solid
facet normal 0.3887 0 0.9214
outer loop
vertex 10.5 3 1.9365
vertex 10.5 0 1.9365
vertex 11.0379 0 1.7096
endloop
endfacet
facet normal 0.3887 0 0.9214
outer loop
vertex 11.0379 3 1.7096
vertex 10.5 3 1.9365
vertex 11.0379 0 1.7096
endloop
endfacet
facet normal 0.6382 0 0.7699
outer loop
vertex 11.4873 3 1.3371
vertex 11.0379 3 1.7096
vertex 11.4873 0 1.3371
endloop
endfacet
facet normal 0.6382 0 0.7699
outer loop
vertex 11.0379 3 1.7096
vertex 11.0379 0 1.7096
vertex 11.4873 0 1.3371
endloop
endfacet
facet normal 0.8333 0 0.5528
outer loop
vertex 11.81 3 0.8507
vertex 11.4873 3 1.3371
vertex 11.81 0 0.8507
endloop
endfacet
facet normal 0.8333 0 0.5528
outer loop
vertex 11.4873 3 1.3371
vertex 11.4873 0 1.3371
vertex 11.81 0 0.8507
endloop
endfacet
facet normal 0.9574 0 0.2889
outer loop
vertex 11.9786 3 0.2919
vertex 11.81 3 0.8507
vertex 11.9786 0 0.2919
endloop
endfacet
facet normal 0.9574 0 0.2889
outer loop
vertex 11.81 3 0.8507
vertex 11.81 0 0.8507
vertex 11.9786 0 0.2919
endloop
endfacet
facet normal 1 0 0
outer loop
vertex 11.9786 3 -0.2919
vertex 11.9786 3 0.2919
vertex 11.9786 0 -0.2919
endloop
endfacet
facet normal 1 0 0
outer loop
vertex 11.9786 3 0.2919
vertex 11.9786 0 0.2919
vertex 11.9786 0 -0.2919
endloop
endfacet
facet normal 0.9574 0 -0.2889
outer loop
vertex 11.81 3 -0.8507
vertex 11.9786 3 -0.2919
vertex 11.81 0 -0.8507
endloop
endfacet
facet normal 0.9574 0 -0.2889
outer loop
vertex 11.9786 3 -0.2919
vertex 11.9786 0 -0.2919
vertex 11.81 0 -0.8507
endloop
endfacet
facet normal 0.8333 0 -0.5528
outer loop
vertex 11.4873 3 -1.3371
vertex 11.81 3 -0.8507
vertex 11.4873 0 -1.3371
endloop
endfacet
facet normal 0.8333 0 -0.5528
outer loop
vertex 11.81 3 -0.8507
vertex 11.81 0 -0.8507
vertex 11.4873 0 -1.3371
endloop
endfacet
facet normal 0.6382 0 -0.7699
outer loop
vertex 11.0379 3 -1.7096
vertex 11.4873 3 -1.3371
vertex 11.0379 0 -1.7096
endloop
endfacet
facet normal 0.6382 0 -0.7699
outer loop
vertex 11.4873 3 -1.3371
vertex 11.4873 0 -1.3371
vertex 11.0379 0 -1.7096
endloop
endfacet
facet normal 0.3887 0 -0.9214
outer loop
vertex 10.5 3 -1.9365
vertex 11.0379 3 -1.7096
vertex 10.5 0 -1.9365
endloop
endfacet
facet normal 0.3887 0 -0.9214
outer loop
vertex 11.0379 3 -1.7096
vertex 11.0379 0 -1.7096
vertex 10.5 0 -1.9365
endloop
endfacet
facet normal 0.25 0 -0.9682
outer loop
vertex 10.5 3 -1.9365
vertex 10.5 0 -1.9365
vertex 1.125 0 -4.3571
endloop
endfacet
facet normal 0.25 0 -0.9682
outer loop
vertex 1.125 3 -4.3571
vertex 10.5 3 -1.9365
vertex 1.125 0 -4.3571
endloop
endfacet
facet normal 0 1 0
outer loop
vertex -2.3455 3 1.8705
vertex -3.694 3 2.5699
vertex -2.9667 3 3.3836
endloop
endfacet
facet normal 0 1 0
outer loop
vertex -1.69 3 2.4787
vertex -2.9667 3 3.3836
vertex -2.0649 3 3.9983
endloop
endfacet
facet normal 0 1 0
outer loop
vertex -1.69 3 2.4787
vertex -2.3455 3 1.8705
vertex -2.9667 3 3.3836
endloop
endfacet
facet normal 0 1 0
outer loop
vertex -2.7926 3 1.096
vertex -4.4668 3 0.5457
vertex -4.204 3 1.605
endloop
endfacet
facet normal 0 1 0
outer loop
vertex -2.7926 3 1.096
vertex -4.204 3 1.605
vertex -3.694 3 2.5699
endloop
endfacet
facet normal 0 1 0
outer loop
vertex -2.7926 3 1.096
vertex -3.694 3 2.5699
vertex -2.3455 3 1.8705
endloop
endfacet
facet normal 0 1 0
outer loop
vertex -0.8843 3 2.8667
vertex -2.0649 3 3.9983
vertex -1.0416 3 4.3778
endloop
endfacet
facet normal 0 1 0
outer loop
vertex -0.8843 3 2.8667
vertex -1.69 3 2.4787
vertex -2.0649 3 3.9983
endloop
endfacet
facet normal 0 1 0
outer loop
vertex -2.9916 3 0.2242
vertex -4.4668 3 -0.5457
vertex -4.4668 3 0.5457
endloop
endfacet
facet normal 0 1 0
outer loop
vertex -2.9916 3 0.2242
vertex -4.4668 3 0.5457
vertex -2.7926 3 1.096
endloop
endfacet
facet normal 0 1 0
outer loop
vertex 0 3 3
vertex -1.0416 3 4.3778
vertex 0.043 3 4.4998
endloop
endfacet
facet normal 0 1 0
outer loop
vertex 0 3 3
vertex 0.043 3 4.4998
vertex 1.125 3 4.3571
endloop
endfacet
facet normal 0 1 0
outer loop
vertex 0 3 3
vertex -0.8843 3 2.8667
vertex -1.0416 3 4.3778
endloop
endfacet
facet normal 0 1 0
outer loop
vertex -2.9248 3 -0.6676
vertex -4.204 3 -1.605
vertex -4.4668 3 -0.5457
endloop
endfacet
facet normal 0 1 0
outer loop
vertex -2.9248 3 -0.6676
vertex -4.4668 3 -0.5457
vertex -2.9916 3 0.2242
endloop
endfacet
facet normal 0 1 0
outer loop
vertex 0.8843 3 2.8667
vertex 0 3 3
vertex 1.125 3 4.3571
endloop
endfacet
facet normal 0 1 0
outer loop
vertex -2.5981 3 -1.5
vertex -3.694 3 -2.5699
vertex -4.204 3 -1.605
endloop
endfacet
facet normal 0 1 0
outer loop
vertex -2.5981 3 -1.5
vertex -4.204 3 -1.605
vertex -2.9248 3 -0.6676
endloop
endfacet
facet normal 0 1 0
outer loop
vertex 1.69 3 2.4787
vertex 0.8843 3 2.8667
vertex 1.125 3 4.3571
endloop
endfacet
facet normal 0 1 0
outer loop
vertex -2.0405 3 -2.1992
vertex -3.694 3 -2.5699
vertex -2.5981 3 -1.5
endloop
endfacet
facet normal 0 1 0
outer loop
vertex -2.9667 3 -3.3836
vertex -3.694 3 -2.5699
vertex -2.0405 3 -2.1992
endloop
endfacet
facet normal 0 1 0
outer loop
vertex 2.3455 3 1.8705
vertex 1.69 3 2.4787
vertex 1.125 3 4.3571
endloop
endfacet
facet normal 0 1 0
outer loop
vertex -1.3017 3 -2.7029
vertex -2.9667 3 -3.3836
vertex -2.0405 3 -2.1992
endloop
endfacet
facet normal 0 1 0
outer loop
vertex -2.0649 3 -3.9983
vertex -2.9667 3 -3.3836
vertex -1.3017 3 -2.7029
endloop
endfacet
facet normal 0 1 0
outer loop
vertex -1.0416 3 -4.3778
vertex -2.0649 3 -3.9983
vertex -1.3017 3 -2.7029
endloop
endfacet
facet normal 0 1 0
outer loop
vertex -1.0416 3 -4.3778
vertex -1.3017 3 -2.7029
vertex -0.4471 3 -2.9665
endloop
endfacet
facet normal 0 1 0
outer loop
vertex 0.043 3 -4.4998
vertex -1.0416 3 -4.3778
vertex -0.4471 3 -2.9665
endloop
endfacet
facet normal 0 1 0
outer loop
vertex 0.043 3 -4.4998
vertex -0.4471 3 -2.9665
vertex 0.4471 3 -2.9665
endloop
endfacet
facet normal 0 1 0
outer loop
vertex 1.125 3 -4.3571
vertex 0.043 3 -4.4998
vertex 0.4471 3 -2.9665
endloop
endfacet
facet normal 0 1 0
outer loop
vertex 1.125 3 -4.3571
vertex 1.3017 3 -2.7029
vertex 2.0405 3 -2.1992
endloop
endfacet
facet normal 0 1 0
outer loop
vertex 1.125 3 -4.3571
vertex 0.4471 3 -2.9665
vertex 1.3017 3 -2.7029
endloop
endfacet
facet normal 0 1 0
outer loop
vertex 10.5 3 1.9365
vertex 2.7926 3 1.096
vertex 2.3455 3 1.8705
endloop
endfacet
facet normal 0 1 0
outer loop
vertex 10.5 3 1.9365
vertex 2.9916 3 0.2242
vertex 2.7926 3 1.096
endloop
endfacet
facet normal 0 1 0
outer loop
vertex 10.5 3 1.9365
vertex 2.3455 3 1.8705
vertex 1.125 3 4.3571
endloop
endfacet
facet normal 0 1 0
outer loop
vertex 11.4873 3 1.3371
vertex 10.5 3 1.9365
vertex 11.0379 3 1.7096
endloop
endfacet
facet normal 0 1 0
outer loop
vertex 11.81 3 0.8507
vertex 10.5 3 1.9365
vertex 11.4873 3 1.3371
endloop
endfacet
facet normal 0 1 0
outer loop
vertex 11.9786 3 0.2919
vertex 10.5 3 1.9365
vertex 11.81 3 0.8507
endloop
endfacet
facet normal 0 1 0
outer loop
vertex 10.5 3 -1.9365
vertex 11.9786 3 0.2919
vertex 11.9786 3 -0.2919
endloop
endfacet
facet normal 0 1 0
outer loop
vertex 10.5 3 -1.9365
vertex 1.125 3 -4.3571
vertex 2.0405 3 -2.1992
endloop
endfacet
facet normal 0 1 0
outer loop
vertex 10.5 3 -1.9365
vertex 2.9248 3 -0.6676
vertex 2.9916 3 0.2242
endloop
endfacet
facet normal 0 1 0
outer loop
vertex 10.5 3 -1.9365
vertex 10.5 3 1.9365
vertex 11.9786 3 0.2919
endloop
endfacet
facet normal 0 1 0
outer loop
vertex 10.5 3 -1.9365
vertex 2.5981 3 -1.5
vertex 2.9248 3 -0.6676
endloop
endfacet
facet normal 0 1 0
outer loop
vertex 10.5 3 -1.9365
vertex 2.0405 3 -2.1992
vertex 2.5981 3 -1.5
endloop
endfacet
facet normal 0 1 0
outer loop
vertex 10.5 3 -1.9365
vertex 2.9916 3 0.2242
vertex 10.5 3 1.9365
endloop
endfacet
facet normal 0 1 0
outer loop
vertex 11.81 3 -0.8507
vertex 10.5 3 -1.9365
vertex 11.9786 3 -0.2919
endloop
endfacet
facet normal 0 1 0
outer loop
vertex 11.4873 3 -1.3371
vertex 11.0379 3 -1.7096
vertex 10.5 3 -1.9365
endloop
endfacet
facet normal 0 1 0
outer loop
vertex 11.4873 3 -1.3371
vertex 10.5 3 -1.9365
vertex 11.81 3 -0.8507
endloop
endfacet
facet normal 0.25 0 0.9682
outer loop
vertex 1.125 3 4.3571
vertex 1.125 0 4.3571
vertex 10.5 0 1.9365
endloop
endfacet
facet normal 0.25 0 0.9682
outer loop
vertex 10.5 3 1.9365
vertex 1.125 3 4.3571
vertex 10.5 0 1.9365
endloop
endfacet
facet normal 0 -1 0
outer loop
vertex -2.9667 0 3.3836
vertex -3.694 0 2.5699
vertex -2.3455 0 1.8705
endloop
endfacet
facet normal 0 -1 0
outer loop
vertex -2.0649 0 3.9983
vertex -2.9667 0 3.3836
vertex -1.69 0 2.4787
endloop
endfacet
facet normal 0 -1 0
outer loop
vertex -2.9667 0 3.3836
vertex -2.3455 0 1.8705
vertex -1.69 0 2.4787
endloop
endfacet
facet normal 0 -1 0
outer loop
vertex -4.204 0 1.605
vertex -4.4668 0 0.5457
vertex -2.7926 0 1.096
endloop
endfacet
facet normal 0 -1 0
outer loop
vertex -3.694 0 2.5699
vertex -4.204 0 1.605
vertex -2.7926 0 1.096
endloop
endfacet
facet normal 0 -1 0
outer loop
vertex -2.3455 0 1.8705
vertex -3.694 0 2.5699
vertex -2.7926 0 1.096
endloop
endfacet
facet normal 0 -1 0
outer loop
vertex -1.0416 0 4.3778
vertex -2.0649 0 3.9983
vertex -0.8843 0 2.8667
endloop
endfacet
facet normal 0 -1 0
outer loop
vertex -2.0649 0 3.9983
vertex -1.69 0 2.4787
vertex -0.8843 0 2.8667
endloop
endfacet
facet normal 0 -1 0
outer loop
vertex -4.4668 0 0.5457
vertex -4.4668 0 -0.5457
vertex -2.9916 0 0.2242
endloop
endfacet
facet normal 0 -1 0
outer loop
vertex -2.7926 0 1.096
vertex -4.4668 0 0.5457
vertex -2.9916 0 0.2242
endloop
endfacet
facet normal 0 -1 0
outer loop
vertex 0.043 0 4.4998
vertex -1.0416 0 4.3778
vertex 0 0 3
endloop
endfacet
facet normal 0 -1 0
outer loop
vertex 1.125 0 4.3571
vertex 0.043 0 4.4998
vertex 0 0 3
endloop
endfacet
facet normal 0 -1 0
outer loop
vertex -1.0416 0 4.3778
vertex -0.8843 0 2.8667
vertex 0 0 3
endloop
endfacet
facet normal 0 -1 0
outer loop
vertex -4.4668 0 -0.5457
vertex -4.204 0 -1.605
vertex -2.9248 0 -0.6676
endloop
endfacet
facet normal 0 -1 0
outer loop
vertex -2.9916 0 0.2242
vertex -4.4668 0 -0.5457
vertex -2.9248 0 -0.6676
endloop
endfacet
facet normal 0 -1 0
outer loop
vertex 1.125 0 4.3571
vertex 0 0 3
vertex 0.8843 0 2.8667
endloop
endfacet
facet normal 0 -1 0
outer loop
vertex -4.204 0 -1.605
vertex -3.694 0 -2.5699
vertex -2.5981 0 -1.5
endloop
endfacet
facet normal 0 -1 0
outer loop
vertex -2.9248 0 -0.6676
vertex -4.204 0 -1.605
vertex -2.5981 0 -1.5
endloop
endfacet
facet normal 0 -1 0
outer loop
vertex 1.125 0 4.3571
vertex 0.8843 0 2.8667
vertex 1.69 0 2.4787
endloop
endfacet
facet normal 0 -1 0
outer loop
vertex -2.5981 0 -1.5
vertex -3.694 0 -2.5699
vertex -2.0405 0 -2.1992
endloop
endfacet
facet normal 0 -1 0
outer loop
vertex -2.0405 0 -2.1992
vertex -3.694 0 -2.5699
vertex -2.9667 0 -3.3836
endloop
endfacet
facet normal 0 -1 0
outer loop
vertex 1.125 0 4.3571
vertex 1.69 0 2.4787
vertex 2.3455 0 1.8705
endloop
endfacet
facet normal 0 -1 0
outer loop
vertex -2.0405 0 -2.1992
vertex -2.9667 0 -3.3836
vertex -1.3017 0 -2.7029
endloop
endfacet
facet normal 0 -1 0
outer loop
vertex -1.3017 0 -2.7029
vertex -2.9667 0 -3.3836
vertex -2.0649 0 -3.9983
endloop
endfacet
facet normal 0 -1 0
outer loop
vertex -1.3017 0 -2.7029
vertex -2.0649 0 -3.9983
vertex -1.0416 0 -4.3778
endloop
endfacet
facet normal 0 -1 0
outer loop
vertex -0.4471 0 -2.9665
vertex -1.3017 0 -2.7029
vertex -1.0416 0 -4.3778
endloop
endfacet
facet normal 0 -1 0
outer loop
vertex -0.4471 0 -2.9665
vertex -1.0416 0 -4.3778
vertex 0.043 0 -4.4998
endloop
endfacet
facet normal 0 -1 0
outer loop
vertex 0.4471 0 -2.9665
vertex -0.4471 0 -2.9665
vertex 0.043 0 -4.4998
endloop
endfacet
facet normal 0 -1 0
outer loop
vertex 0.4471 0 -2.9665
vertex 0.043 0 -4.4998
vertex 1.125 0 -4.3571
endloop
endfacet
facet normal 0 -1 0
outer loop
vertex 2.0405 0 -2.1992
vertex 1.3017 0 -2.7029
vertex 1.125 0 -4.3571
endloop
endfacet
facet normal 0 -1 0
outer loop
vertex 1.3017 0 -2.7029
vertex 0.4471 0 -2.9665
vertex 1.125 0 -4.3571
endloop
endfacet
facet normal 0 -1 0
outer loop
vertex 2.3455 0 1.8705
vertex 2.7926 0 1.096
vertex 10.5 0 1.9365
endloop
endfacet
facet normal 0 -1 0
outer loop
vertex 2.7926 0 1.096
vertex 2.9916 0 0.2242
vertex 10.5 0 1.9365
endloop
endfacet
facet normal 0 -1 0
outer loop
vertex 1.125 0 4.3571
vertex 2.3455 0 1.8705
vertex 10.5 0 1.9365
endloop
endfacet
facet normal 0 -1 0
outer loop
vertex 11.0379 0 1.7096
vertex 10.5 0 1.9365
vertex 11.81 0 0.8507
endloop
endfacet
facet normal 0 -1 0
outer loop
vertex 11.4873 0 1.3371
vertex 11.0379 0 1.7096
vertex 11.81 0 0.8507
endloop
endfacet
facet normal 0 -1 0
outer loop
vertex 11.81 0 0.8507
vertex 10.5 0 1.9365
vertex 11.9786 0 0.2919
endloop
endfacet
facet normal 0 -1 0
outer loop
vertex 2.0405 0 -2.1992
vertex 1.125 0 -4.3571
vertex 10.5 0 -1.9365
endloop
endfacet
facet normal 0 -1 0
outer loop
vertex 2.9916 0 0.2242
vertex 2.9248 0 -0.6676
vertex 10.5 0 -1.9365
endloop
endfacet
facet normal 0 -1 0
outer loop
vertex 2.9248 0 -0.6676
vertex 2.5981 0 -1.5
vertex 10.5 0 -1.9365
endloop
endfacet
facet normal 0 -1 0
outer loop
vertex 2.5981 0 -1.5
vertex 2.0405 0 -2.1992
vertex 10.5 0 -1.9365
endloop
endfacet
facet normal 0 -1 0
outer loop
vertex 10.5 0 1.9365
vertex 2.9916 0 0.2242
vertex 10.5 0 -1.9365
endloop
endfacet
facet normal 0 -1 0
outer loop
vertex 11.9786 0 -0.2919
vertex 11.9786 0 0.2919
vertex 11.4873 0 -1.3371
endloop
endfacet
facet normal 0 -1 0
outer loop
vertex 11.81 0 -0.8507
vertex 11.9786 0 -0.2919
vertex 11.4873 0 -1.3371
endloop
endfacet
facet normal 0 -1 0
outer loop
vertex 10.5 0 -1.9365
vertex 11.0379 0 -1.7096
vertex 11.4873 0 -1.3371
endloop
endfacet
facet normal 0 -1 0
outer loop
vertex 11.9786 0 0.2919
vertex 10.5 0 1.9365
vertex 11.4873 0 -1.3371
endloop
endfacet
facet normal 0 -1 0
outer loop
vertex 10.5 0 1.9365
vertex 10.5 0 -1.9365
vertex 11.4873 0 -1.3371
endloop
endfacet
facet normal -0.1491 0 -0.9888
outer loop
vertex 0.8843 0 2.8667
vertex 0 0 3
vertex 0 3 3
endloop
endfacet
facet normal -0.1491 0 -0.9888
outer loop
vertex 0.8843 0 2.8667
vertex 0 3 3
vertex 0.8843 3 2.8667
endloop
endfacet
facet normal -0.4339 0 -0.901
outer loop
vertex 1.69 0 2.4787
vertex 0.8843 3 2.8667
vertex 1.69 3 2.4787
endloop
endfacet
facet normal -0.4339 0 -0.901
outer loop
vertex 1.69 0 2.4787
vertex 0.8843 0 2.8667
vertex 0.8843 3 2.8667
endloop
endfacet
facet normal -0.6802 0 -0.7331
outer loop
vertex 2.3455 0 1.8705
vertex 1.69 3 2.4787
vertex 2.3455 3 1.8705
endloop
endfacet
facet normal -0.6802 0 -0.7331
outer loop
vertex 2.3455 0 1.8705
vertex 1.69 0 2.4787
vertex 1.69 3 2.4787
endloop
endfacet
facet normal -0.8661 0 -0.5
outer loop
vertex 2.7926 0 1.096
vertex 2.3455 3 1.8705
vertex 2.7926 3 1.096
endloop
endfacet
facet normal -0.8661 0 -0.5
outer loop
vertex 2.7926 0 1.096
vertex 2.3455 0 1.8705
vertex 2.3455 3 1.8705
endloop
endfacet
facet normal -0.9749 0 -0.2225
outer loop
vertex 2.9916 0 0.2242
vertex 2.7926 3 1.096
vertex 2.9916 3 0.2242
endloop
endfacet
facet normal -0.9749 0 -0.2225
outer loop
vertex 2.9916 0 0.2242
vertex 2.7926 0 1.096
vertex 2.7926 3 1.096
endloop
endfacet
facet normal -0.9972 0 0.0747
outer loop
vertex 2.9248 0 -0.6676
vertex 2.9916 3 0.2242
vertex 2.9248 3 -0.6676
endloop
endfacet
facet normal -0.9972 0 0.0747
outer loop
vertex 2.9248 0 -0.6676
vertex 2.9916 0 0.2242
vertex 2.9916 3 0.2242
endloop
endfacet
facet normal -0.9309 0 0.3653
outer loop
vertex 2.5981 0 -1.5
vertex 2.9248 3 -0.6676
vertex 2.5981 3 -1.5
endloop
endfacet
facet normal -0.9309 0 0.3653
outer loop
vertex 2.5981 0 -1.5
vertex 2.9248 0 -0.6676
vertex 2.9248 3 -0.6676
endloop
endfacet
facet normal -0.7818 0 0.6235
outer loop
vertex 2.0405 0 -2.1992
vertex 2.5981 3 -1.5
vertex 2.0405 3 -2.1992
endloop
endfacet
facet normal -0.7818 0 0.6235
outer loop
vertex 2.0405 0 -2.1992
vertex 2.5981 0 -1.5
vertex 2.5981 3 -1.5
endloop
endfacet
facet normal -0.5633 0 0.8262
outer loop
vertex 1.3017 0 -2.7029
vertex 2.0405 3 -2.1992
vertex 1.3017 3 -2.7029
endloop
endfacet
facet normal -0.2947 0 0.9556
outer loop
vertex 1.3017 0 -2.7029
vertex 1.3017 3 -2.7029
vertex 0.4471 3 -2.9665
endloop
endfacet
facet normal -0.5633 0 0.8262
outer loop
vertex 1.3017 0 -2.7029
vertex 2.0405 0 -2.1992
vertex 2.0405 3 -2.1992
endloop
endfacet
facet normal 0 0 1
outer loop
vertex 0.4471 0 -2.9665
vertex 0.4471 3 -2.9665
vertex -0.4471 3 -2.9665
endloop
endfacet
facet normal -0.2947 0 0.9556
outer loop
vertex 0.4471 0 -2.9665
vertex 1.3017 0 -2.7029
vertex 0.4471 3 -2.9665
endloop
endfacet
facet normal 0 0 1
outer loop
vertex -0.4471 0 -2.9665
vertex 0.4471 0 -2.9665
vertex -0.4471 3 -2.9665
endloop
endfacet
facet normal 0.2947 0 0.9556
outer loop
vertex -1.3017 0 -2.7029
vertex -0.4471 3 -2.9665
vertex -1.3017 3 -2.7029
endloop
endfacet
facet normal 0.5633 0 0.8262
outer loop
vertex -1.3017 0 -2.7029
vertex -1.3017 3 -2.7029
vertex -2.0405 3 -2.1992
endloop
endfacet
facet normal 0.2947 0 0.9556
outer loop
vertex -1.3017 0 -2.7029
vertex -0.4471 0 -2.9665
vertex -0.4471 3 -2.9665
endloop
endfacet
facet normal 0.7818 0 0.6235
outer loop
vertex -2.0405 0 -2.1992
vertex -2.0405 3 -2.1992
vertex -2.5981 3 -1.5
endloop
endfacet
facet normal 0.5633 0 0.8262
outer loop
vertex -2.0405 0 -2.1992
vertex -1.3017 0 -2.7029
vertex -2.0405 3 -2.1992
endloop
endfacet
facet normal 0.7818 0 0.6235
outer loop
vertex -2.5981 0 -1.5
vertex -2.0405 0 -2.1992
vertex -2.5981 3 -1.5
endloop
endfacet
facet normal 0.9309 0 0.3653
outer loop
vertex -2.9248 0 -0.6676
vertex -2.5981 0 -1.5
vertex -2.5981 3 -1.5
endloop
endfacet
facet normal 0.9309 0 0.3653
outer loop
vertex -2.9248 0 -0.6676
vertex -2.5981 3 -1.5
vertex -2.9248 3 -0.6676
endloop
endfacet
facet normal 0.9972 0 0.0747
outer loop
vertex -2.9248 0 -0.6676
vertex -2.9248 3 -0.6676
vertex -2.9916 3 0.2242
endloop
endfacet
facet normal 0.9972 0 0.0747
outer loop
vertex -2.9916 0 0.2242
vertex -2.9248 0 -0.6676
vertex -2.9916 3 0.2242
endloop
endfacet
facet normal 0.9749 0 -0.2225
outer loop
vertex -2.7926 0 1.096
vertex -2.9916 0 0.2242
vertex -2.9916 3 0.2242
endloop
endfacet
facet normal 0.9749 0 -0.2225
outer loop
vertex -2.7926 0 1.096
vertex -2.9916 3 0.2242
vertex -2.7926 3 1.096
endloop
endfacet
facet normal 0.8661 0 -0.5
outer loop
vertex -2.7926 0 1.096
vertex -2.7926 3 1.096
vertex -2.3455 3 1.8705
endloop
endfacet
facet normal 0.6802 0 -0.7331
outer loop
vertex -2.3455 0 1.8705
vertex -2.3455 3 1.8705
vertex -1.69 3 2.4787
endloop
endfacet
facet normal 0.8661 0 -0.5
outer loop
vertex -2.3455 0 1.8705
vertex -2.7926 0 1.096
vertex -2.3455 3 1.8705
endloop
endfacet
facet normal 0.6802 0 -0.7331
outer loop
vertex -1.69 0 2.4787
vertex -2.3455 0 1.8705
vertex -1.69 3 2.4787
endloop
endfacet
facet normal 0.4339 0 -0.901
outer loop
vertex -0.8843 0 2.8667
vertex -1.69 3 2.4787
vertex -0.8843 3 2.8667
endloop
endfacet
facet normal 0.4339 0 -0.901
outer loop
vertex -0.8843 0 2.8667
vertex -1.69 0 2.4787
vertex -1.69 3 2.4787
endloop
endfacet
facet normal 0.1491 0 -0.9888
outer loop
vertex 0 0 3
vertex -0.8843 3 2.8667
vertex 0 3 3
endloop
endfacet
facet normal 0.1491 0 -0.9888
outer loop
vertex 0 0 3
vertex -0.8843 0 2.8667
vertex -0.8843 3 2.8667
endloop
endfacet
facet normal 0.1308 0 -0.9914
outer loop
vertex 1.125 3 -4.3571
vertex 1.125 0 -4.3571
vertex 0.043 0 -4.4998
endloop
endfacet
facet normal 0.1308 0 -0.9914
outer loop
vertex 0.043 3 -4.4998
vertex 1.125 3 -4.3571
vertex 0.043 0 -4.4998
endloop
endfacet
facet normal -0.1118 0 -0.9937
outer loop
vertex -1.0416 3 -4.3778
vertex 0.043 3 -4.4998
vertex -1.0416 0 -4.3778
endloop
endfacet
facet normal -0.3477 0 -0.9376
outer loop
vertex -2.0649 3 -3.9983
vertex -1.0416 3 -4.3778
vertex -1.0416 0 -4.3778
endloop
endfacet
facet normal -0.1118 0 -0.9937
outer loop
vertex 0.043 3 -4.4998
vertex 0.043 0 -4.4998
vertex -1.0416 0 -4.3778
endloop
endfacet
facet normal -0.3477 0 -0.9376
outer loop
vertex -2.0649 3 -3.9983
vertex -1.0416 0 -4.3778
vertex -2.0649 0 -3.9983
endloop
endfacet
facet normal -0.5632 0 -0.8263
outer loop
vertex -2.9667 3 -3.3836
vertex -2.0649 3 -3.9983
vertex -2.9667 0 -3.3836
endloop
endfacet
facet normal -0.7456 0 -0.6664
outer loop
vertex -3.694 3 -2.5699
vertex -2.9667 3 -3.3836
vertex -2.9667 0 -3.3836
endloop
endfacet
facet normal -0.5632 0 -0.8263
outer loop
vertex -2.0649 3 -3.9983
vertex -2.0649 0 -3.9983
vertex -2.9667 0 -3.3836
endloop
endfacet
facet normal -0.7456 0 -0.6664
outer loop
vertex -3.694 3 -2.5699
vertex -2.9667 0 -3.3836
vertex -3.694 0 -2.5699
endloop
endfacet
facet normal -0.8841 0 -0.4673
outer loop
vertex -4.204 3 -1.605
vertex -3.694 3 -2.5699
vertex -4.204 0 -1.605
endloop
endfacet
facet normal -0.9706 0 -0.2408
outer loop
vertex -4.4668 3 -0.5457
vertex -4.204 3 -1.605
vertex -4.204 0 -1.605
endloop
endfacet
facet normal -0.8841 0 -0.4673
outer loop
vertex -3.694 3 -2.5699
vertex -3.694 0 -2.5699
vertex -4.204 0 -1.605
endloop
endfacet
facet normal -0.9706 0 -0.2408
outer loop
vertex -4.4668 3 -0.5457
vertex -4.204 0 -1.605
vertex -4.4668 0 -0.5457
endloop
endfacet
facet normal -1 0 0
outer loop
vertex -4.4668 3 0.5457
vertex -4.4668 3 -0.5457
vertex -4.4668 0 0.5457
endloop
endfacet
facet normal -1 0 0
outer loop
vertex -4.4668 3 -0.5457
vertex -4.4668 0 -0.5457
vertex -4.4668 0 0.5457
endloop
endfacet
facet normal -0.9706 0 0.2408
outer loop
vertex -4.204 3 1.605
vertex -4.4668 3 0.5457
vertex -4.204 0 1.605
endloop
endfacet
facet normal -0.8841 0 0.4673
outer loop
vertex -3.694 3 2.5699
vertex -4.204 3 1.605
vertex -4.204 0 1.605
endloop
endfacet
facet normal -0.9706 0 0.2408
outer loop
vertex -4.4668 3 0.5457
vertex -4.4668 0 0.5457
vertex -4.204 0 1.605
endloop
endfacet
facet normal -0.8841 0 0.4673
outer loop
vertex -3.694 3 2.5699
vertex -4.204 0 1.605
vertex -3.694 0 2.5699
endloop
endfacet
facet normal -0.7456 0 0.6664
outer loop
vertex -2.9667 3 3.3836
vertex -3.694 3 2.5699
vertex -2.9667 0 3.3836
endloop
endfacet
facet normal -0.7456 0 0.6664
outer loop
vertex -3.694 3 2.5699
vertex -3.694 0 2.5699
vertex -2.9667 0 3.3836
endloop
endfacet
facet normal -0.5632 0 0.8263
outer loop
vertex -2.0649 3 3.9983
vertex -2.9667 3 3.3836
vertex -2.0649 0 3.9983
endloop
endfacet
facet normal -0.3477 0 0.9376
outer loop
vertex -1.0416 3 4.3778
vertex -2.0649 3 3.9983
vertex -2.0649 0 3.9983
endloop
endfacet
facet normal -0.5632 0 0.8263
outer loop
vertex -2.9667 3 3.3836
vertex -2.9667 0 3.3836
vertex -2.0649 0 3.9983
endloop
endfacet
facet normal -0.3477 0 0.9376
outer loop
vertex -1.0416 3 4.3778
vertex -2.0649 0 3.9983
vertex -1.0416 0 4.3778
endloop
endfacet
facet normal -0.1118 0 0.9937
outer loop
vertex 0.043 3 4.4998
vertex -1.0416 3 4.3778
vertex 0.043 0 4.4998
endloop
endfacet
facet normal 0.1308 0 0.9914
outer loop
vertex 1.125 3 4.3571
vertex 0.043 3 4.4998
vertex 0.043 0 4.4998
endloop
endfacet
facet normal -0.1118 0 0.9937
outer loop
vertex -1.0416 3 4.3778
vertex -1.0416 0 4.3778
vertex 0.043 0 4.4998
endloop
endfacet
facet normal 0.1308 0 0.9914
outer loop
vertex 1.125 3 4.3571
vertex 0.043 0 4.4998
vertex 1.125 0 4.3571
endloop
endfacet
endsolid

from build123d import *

# Parameters (mm, degrees)
SKETCH_1_R      = 4.5
SKETCH_1_R_2    = 3
SKETCH_1_R_3    = 2
EXTRUDE_1_DEPTH = 3


with BuildPart() as part:
    # 草图1 → 凸台-拉伸1 (new body)
    # profile 1 of 3: a face of its own
    with BuildSketch(Plane(origin=(0, 0, 0), x_dir=(1, 0, 0), z_dir=(0, 1, 0))):
        Circle(SKETCH_1_R)
        with Locations(Location((0, 0, 0), (0, 0, 270))):
            Circle(SKETCH_1_R_2, mode=Mode.SUBTRACT)
    # profile 2 of 3: a face of its own
    with BuildSketch(Plane(origin=(0, 0, 0), x_dir=(1, 0, 0), z_dir=(0, 1, 0))):
        with BuildLine():
            ThreePointArc((10.5, -1.936491675), (8, -2e-09), (10.5, 1.936491671))
            Line((10.5, 1.936491671), (1.125000001, 4.357106264))
            ThreePointArc((1.125000001, 4.357106264), (3.557562368, 2.75567596), (4.5, 0))
            ThreePointArc((4.5, 0), (3.557562367, -2.755675961), (1.124999999, -4.357106265))
            Line((1.124999999, -4.357106265), (10.5, -1.936491675))
        make_face()
    # profile 3 of 3: a face of its own
    with BuildSketch(Plane(origin=(0, 0, 0), x_dir=(1, 0, 0), z_dir=(0, 1, 0))):
        with Locations((10, -2e-09)):
            Circle(SKETCH_1_R_3)
    extrude(amount=EXTRUDE_1_DEPTH)


solid = part.part
